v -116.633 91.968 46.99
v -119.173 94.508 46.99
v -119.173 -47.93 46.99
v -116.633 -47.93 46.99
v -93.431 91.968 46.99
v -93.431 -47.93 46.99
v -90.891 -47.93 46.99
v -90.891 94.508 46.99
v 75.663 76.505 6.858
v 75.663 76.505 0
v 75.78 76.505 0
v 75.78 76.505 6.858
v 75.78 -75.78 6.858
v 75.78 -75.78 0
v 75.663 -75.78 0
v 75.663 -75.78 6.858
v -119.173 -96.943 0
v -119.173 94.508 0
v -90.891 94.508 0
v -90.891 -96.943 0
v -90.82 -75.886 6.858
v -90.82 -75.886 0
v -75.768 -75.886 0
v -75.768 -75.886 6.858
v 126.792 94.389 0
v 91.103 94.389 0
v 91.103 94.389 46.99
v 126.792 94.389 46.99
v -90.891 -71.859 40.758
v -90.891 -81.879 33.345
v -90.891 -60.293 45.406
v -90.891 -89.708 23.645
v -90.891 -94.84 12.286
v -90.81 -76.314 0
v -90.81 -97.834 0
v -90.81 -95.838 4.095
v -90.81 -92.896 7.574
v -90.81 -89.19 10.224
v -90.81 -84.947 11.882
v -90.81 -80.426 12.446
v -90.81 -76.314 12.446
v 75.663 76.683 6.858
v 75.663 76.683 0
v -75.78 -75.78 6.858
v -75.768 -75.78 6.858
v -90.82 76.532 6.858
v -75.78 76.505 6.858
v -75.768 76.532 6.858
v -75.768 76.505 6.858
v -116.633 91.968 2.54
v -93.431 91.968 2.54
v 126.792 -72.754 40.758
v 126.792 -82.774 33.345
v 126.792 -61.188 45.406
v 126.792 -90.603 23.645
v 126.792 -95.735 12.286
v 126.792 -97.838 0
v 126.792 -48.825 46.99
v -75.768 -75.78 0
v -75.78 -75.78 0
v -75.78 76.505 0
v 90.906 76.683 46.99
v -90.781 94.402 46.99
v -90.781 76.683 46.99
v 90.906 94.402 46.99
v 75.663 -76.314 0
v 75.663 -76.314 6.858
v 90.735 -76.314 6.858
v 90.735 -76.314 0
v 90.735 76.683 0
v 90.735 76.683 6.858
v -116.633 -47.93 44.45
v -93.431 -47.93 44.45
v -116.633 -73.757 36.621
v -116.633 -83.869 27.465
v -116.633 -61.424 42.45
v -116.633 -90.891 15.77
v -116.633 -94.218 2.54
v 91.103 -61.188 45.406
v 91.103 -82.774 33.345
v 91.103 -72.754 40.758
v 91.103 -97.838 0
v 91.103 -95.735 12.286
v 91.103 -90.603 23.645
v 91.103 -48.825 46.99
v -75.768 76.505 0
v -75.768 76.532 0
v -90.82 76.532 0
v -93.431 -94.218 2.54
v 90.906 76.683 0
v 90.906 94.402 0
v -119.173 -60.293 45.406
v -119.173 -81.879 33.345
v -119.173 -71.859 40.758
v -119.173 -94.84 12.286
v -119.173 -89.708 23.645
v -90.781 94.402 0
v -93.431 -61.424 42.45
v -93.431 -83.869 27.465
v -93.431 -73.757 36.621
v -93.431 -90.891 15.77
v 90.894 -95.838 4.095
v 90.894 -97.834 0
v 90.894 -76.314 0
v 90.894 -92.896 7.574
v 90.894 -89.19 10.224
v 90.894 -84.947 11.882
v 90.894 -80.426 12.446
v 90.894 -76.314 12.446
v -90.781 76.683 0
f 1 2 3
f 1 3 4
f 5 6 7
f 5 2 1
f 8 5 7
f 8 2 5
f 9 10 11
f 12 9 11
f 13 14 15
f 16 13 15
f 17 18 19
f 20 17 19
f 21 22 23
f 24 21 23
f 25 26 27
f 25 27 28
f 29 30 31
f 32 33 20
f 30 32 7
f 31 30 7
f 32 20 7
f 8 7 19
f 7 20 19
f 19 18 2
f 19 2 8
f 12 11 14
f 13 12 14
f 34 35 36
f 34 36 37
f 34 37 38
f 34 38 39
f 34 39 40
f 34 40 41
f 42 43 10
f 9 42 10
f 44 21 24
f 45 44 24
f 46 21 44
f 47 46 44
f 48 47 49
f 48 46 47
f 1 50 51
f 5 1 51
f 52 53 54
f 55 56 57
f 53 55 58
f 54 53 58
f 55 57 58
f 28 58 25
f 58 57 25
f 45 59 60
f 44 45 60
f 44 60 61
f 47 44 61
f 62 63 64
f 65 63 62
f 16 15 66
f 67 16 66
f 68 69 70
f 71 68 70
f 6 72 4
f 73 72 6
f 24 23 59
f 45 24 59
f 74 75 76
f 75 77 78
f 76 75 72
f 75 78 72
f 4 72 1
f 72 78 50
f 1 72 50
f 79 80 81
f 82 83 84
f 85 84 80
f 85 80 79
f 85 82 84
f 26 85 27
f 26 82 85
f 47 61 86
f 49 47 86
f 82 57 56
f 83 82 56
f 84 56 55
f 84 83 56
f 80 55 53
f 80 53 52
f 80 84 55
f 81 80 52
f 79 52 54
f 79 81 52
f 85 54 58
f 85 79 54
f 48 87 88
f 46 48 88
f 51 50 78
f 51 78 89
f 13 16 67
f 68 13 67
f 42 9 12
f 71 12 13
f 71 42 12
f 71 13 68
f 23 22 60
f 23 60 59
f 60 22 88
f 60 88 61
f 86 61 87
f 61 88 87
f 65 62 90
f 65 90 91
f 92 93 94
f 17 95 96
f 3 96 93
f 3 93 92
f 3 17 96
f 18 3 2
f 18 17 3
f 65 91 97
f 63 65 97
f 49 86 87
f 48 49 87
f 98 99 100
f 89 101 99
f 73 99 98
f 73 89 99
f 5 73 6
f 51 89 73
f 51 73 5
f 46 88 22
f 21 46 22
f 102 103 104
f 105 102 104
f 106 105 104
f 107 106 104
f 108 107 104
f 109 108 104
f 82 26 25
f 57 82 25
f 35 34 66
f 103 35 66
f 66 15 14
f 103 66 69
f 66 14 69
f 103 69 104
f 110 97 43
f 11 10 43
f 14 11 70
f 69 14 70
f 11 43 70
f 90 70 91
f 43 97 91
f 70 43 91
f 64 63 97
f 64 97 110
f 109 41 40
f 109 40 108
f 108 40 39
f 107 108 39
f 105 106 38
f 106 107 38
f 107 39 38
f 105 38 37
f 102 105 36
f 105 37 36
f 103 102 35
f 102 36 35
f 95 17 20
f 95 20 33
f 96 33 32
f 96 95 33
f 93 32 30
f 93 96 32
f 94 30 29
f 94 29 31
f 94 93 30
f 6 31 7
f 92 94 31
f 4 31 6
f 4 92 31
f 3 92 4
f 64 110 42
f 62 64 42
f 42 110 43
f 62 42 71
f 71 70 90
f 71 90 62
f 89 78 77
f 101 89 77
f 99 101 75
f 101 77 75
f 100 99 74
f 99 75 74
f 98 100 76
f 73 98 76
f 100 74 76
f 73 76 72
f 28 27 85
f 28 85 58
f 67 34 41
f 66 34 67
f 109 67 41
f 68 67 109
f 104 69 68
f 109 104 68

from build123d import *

# Parameters (mm, degrees)
F3_DEPTH       = 46.99
F4_DEPTH       = 6.858
F5_W           = 181.7035898566
F5_H           = 21.5198099613
F6_DEPTH       = 12.446
F7_W           = 28.2824411988
F7_H           = 191.4503723383
F8_DEPTH       = 46.99
F9_W           = 35.6884747744
F9_H           = 192.2272518277
F10_DEPTH      = 46.99
F11_T1_DEPTH   = 273.3487487987
F11_2_T1_DEPTH = 280.7547823743
F12_T1_DEPTH   = 268.7406461084
F13_T          = -2.54


# Not quite as in the source:
# - a fillet or chamfer that OpenCascade refuses, or shapes differently, is made with other operations: its cross-section is extruded or revolved along the edge and cut away or added
# - a shell that OpenCascade refuses in one call is made with other operations: the cavity is built on its own and cut out


with BuildPart() as f3:
    # F2 (on face) → F3 (new body)
    with BuildSketch(Plane.XY):
        Polygon((-90.7814130187, 94.4018736482), (-90.7814130187, 76.682575047), (-76.9056975842, 76.682575047), (77.2037953138, 76.682575047), (90.9062623978, 76.682575047), (90.9062623978, 94.4018736482), align=None)
    extrude(amount=F3_DEPTH)

    # F1 (on face) → F4, piece 2 (join)
    with BuildSketch(Plane.XY):
        Polygon((75.6627693772, 77.2247835994), (75.6627693772, 76.5050277114), (75.7798627019, 76.5050277114), (75.7798627019, -75.7798627019), (75.6627693772, -75.7798627019), (75.6627693772, -78.6267369986), (90.7352864742, -78.6267369986), (90.7352864742, 77.2247835994), align=None)
    extrude(amount=F4_DEPTH)

    # F5 (on face) → F6 (join)
    with BuildSketch(Plane.XY):
        with Locations((0.0419504941, -87.0736762881)):
            Rectangle(F5_W, F5_H)
    extrude(amount=F6_DEPTH)

    # F12: fillet of radius 18.3963073453 on 1 edges, made by hand

    # F12_s2 → F12_t1 (cut)
    with BuildSketch(Plane.YZ.offset(-134.3283725601)):
        with BuildLine():
            ThreePointArc((-80.4261700184, 12.446), (-91.1257130278, 9.0144480263), (-97.8335812688, 0))
            Line((-97.8335812688, 0), (-97.8335812688, 12.446))
            Line((-97.8335812688, 12.446), (-80.4261700184, 12.446))
        make_face()
    extrude(amount=F12_T1_DEPTH, mode=Mode.SUBTRACT)


with BuildPart() as f4:
    # F1 (on face) → F4 (new body)
    with BuildSketch(Plane.XY):
        Polygon((-75.7678225636, 76.5050277114), (-75.7678225636, 76.5324681997), (-90.8200368285, 76.5324681997), (-90.8200368285, -75.8864879608), (-75.7678225636, -75.8864879608), (-75.7678225636, -75.7798627019), (-75.7798701525, -75.7798627019), (-75.7798701525, 76.5050277114), align=None)
    extrude(amount=F4_DEPTH)


with BuildPart() as f8:
    # F7 (on face) → F8 (new body)
    with BuildSketch(Plane.XY):
        with Locations((-105.0322689116, -1.2175962329)):
            Rectangle(F7_W, F7_H)
    extrude(amount=F8_DEPTH)

    # F11: fillet of radius 49.0568195874 on 1 edges, made by hand

    # F11_s2 → F11_t1 (cut)
    with BuildSketch(Plane.YZ.offset(-241.706643311)):
        with BuildLine():
            ThreePointArc((-96.942782402, 0), (-81.8793364369, 33.3447826331), (-47.9295208821, 46.99))
            Line((-47.9295208821, 46.99), (-96.942782402, 46.99))
            Line((-96.942782402, 46.99), (-96.942782402, 0))
        make_face()
    extrude(amount=F11_T1_DEPTH, mode=Mode.SUBTRACT)

    # F13: a shell. OpenCascade refuses it in one call, so the cavity is built on its own and cut out:
    # the body offset inwards by the wall thickness, plus a prism from it out through each open face.
    f13_core = offset(f8.part, amount=F13_T, mode=Mode.PRIVATE)
    f13_exits = [f13_core.faces().sort_by_distance(p)[0] for p in [
        (-105.032269, 22.019035, 44.45),
    ]]
    add(f13_core, mode=Mode.SUBTRACT)
    extrude(f13_exits, amount=-F13_T, mode=Mode.SUBTRACT)


with BuildPart() as f10:
    # F9 (on face) → F10 (new body)
    with BuildSketch(Plane.XY):
        with Locations((108.9476123452, -1.7242766917)):
            Rectangle(F9_W, F9_H)
    extrude(amount=F10_DEPTH)

    # F11#2: fillet of radius 49.0568195874 on 1 edges, made by hand

    # F11_2_s2 → F11_2_t1 (cut)
    with BuildSketch(Plane.YZ.offset(-31.4297788419)):
        with BuildLine():
            ThreePointArc((-97.8379026055, 0), (-82.7744566404, 33.3447826331), (-48.8246410856, 46.99))
            Line((-48.8246410856, 46.99), (-97.8379026055, 46.99))
            Line((-97.8379026055, 46.99), (-97.8379026055, 0))
        make_face()
    extrude(amount=F11_2_T1_DEPTH, mode=Mode.SUBTRACT)


solid = Compound([f3.part, f4.part, f8.part, f10.part])
